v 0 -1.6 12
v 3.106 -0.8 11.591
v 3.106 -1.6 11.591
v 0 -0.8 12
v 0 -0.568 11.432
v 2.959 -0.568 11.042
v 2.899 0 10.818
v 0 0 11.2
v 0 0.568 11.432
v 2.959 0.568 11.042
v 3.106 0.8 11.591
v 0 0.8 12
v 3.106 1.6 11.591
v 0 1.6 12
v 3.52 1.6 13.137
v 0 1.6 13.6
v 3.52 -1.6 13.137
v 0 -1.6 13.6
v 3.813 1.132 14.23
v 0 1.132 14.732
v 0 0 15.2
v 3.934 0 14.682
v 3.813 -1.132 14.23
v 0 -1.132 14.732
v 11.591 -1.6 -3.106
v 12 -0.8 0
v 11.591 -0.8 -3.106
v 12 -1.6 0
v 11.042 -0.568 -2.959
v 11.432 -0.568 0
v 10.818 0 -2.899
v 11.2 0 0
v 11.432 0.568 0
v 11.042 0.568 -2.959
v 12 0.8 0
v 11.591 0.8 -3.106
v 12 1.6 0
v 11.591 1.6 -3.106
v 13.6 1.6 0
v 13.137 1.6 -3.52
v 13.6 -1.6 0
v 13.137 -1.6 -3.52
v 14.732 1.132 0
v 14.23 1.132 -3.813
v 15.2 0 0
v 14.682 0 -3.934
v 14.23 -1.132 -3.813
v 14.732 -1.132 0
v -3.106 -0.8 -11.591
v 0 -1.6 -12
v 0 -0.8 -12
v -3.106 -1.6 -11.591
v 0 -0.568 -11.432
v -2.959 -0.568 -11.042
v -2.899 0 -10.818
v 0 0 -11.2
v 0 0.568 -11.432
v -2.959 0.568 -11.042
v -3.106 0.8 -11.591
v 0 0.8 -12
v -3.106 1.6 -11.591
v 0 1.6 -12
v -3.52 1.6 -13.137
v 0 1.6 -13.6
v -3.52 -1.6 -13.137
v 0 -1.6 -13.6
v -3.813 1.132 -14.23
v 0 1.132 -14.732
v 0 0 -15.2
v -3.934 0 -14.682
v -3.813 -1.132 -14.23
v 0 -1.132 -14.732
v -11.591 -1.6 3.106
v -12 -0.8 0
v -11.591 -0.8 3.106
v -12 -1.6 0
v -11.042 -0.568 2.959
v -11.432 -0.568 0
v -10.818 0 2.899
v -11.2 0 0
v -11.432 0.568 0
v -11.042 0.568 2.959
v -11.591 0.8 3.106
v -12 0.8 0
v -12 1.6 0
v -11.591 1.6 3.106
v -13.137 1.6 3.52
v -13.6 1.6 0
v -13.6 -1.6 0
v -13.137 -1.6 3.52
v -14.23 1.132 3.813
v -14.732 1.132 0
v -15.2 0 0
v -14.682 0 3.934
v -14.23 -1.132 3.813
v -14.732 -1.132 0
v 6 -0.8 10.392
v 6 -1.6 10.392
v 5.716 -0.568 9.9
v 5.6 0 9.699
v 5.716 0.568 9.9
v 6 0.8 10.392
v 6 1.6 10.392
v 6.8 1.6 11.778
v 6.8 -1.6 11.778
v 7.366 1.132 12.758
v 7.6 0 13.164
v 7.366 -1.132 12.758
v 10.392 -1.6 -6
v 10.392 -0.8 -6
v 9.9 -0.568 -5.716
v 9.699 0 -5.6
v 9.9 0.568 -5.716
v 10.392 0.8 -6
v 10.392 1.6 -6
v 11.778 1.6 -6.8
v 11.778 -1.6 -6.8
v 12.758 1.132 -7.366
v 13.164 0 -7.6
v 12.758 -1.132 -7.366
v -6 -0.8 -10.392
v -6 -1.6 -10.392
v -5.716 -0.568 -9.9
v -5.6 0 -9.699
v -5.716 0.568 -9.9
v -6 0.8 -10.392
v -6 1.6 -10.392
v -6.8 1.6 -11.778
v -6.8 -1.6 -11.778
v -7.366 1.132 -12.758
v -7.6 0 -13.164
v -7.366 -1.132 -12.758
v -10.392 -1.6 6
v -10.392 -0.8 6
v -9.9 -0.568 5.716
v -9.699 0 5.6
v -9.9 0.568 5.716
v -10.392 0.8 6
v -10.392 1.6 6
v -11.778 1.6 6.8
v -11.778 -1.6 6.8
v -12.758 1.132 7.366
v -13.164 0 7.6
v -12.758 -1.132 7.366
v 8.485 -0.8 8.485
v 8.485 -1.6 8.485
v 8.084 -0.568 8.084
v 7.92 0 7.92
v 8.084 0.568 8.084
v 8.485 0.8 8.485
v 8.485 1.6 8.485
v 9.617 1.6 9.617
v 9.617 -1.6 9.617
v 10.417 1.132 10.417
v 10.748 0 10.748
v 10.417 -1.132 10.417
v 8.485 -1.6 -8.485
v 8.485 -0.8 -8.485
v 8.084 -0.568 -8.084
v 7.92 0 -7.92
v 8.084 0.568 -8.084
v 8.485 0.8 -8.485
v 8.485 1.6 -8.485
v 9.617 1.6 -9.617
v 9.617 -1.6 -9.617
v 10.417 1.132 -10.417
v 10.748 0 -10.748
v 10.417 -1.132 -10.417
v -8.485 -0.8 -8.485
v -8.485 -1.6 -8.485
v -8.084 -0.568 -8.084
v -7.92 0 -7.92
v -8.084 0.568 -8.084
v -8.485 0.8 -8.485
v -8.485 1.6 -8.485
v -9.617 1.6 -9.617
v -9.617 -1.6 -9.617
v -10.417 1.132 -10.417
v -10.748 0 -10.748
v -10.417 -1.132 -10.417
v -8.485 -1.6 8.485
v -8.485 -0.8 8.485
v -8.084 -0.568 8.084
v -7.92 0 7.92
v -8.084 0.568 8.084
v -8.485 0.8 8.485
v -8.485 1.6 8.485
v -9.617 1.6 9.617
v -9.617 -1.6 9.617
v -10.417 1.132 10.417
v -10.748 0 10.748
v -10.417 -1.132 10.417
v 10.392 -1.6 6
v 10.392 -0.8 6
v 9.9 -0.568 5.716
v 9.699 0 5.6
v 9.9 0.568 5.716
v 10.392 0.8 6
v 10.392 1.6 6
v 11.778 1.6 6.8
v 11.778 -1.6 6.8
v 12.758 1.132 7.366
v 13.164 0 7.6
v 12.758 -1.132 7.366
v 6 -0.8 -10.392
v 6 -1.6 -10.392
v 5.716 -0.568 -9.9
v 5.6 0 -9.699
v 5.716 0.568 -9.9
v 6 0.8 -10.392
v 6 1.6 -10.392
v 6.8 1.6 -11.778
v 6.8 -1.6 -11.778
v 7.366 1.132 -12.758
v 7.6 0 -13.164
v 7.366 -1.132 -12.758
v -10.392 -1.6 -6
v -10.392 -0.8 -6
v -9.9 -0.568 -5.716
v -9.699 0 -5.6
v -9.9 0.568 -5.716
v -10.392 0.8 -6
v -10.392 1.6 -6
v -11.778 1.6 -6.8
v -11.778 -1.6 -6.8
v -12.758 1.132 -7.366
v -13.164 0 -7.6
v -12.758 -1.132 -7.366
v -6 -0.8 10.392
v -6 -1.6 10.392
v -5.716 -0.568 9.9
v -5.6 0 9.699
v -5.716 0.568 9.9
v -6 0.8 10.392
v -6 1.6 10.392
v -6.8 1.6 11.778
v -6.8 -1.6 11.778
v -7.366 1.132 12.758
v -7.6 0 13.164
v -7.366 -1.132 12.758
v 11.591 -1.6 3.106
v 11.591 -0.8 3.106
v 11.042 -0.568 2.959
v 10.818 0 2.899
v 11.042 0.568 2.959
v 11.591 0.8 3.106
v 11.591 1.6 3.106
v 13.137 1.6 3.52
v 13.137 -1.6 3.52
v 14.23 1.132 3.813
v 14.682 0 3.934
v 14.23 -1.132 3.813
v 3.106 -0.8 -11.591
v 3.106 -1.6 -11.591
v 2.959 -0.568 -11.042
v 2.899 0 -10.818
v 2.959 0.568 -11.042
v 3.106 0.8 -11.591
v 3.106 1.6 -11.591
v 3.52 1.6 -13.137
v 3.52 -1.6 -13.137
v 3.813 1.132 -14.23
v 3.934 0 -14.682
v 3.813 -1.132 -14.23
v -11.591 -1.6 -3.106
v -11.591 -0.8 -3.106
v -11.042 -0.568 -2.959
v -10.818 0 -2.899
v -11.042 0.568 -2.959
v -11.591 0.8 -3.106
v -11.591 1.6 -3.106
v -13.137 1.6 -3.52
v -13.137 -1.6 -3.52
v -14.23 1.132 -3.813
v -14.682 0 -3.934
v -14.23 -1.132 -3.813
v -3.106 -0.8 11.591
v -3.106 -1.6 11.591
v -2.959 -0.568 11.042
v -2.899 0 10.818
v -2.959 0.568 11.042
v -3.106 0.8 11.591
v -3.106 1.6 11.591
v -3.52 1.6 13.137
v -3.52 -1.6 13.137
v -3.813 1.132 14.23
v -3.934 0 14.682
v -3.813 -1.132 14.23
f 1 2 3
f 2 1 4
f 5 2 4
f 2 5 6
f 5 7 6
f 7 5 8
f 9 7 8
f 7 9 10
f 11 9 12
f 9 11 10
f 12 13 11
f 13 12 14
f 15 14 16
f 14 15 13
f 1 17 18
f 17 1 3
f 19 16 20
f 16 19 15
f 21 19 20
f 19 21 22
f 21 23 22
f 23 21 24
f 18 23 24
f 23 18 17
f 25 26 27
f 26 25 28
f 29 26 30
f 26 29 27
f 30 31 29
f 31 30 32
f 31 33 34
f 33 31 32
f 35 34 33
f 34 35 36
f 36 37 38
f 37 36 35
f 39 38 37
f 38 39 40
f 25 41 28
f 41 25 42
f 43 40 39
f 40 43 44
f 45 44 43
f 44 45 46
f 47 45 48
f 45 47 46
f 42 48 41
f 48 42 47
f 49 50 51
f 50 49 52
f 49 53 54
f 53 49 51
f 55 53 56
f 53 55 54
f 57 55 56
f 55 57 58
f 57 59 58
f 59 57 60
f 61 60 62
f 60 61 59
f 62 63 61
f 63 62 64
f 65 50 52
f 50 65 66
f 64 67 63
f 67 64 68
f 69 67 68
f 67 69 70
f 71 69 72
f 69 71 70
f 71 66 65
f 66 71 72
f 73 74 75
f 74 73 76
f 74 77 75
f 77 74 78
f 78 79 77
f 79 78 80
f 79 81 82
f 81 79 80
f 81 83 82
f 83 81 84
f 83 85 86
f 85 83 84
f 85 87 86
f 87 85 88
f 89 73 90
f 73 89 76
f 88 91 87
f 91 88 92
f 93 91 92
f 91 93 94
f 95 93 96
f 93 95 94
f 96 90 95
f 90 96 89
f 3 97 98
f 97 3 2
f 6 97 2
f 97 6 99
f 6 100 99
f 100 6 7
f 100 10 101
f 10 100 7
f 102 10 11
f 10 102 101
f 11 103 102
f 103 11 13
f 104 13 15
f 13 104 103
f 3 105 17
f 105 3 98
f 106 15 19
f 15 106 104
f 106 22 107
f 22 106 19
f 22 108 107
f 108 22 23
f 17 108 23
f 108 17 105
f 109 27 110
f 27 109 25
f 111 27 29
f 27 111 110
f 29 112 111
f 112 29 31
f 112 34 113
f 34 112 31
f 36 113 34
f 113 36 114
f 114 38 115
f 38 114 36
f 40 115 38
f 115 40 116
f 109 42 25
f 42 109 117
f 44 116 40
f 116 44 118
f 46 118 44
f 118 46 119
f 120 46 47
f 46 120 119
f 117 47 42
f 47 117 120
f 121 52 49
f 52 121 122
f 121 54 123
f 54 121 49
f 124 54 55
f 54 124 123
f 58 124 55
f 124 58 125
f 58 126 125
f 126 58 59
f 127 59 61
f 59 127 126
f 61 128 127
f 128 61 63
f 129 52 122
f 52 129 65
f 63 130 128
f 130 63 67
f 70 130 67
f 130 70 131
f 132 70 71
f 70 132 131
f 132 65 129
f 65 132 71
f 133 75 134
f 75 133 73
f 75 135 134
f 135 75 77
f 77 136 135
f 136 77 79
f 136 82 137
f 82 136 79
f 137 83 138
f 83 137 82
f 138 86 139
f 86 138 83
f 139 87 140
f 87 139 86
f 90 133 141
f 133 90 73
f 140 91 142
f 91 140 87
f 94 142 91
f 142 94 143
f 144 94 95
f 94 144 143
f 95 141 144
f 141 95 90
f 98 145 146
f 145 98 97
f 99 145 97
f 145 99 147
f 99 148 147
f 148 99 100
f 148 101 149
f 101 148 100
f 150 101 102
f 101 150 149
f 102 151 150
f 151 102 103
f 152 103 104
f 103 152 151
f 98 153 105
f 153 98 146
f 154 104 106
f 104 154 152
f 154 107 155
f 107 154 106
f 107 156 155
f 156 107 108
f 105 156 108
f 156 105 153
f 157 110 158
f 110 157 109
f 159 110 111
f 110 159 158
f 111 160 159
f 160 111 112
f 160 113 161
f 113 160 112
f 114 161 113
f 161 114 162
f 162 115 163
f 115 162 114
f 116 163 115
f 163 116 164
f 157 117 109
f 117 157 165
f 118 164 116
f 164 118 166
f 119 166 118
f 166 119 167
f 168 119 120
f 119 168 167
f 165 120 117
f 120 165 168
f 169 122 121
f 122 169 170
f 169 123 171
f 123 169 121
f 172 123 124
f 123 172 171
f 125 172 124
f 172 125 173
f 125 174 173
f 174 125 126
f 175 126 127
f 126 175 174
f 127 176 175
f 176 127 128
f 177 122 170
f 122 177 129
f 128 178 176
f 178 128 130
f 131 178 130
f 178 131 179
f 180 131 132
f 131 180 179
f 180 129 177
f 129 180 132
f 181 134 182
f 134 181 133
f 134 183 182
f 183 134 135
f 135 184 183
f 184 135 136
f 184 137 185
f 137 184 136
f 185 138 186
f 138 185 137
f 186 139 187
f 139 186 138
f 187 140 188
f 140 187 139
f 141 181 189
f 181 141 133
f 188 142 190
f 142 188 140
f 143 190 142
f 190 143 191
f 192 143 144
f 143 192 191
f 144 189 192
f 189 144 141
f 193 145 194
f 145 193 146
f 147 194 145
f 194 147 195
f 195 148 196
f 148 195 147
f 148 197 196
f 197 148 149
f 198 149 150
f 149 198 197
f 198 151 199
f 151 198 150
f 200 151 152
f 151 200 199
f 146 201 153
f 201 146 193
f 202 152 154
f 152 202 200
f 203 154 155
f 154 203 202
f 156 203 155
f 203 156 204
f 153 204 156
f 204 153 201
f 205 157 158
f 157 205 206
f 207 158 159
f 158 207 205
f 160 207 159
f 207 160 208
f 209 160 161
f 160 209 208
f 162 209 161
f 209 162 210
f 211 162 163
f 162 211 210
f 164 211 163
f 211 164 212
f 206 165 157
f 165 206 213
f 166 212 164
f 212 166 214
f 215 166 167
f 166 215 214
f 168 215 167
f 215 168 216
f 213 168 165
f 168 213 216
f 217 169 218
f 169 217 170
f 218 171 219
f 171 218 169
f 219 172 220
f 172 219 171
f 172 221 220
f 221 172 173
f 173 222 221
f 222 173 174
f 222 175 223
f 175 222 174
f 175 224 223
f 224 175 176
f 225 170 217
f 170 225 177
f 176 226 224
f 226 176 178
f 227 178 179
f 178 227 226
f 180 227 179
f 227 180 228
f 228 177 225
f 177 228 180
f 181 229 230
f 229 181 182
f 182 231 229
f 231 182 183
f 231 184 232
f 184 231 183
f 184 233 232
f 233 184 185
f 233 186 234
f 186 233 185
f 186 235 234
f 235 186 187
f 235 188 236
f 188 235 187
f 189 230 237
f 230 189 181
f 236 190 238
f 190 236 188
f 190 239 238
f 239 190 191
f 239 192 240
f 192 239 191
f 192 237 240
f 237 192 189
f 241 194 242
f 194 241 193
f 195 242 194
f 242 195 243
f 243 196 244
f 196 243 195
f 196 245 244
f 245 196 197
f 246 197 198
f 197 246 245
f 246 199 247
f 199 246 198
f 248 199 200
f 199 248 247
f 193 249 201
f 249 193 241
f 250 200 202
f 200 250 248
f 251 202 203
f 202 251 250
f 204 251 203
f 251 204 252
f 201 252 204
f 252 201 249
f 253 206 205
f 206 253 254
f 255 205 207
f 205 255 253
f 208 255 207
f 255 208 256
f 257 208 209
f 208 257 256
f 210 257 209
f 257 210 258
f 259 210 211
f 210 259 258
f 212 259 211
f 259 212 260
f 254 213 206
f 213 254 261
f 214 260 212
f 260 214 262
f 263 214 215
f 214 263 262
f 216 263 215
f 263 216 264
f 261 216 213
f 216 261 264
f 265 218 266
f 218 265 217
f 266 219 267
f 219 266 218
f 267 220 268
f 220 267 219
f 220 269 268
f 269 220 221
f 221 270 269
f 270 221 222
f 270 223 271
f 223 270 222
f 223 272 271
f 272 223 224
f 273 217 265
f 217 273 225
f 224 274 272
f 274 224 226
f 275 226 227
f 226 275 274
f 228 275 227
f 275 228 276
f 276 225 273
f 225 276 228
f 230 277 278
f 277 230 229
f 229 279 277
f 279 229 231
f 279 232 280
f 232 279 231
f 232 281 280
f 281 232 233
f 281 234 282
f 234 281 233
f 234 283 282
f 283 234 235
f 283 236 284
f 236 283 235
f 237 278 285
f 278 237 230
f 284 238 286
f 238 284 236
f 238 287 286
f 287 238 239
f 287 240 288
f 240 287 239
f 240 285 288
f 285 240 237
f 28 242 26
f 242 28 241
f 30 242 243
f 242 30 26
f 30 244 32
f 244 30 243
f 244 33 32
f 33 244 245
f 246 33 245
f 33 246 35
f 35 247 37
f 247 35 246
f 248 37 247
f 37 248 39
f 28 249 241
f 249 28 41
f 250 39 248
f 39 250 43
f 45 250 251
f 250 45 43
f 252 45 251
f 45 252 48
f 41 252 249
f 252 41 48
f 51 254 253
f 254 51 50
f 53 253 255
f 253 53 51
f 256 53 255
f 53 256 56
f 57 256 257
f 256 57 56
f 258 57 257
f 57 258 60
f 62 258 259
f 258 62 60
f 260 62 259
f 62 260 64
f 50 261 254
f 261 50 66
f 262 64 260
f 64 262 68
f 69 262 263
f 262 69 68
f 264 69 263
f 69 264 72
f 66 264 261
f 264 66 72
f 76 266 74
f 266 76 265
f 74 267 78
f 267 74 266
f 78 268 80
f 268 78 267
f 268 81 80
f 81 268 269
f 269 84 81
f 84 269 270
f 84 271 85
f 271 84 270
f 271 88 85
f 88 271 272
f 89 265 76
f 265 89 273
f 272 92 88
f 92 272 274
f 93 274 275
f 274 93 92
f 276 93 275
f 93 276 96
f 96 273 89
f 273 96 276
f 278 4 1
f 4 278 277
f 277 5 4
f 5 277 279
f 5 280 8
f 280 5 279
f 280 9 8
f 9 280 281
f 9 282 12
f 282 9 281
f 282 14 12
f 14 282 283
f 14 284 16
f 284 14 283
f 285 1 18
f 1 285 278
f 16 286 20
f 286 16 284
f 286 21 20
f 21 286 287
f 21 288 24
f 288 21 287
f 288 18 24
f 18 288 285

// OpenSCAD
// file: ../p/4-4edge.scad
use <../lib.scad>
$fa=1; $fs=0.2;
function ldraw_lib__4_4edge(realsolid=false) = [
// 0 Circle 1.0
// 0 Name: 4-4edge.dat
// 0 Author: James Jessiman
// 0 !LDRAW_ORG Primitive UPDATE 2017-01
// 0 !LICENSE Licensed under CC BY 2.0 and CC BY 4.0 : see CAreadme.txt
// 
// 0 BFC CERTIFY CCW
  [0,"BFC","CERTIFY"],
  [0,"BFC","CCW"],
// 
// 0 !HISTORY 1998-12-15 [PTadmin] Official Update 1998-10
// 0 !HISTORY 2005-12-28 [PTadmin] Official Update 2005-01
// 0 !HISTORY 2007-06-24 [PTadmin] Header formatted for Contributor Agreement
// 0 !HISTORY 2008-07-01 [PTadmin] Official Update 2008-01
// 0 !HISTORY 2017-01-15 [Steffen] BFCed
// 0 !HISTORY 2017-12-30 [PTadmin] Official Update 2017-01
// 
// 
// 2 24 1 0 0 0.9239 0 0.3827
  [2,24,1,0,0,0.9239,0,0.3827],
// 2 24 0.9239 0 0.3827 0.7071 0 0.7071
  [2,24,0.9239,0,0.3827,0.7071,0,0.7071],
// 2 24 0.7071 0 0.7071 0.3827 0 0.9239
  [2,24,0.7071,0,0.7071,0.3827,0,0.9239],
// 2 24 0.3827 0 0.9239 0 0 1
  [2,24,0.3827,0,0.9239,0,0,1],
// 2 24 0 0 1 -0.3827 0 0.9239
  [2,24,0,0,1,-0.3827,0,0.9239],
// 2 24 -0.3827 0 0.9239 -0.7071 0 0.7071
  [2,24,-0.3827,0,0.9239,-0.7071,0,0.7071],
// 2 24 -0.7071 0 0.7071 -0.9239 0 0.3827
  [2,24,-0.7071,0,0.7071,-0.9239,0,0.3827],
// 2 24 -0.9239 0 0.3827 -1 0 -0
  [2,24,-0.9239,0,0.3827,-1,0,-0],
// 2 24 -1 0 -0 -0.9239 0 -0.3827
  [2,24,-1,0,-0,-0.9239,0,-0.3827],
// 2 24 -0.9239 0 -0.3827 -0.7071 0 -0.7071
  [2,24,-0.9239,0,-0.3827,-0.7071,0,-0.7071],
// 2 24 -0.7071 0 -0.7071 -0.3827 0 -0.9239
  [2,24,-0.7071,0,-0.7071,-0.3827,0,-0.9239],
// 2 24 -0.3827 0 -0.9239 0 0 -1
  [2,24,-0.3827,0,-0.9239,0,0,-1],
// 2 24 0 0 -1 0.3827 0 -0.9239
  [2,24,0,0,-1,0.3827,0,-0.9239],
// 2 24 0.3827 0 -0.9239 0.7071 0 -0.7071
  [2,24,0.3827,0,-0.9239,0.7071,0,-0.7071],
// 2 24 0.7071 0 -0.7071 0.9239 0 -0.3827
  [2,24,0.7071,0,-0.7071,0.9239,0,-0.3827],
// 2 24 0.9239 0 -0.3827 1 0 0
  [2,24,0.9239,0,-0.3827,1,0,0],
];
module ldraw_lib__4_4edge(step=0, col=false, unit=2/5, alt=false, line=0.2, solid=!$preview)
    makepoly(ldraw_lib__4_4edge(solid), step=step, col=col, unit=unit, alt=alt, line=line, solid=solid);
ldraw_lib__4_4edge(line=0.2);
// file: ../p/4-4disc.scad
use <../lib.scad>
$fa=1; $fs=0.2;
function ldraw_lib__4_4disc(realsolid=false) = [
// 0 Disc 1.0
// 0 Name: 4-4disc.dat
// 0 Author: James Jessiman
// 0 !LDRAW_ORG Primitive UPDATE 2002-02
// 0 !LICENSE Licensed under CC BY 2.0 and CC BY 4.0 : see CAreadme.txt
// 
// 0 BFC CERTIFY CCW
  [0,"BFC","CERTIFY"],
  [0,"BFC","CCW"],
// 
// 0 !HISTORY 1998-12-15 [PTadmin] Official Update 1998-10
// 0 !HISTORY 2002-03-23 [sbliss] Added BFC statement
// 0 !HISTORY 2002-04-25 [PTadmin] Official Update 2002-02
// 0 !HISTORY 2007-06-24 [PTadmin] Header formatted for Contributor Agreement
// 0 !HISTORY 2008-07-01 [PTadmin] Official Update 2008-01
// 
// 
// 3 16 0 0 0 1 0 0 0.9239 0 0.3827
  [3,16,0,0,0,1,0,0,0.9239,0,0.3827],
// 3 16 0 0 0 0.9239 0 0.3827 0.7071 0 0.7071
  [3,16,0,0,0,0.9239,0,0.3827,0.7071,0,0.7071],
// 3 16 0 0 0 0.7071 0 0.7071 0.3827 0 0.9239
  [3,16,0,0,0,0.7071,0,0.7071,0.3827,0,0.9239],
// 3 16 0 0 0 0.3827 0 0.9239 0 0 1
  [3,16,0,0,0,0.3827,0,0.9239,0,0,1],
// 3 16 0 0 0 0 0 1 -0.3827 0 0.9239
  [3,16,0,0,0,0,0,1,-0.3827,0,0.9239],
// 3 16 0 0 0 -0.3827 0 0.9239 -0.7071 0 0.7071
  [3,16,0,0,0,-0.3827,0,0.9239,-0.7071,0,0.7071],
// 3 16 0 0 0 -0.7071 0 0.7071 -0.9239 0 0.3827
  [3,16,0,0,0,-0.7071,0,0.7071,-0.9239,0,0.3827],
// 3 16 0 0 0 -0.9239 0 0.3827 -1 0 -0
  [3,16,0,0,0,-0.9239,0,0.3827,-1,0,-0],
// 3 16 0 0 0 -1 0 -0 -0.9239 0 -0.3827
  [3,16,0,0,0,-1,0,-0,-0.9239,0,-0.3827],
// 3 16 0 0 0 -0.9239 0 -0.3827 -0.7071 0 -0.7071
  [3,16,0,0,0,-0.9239,0,-0.3827,-0.7071,0,-0.7071],
// 3 16 0 0 0 -0.7071 0 -0.7071 -0.3827 0 -0.9239
  [3,16,0,0,0,-0.7071,0,-0.7071,-0.3827,0,-0.9239],
// 3 16 0 0 0 -0.3827 0 -0.9239 0 0 -1
  [3,16,0,0,0,-0.3827,0,-0.9239,0,0,-1],
// 3 16 0 0 0 0 0 -1 0.3827 0 -0.9239
  [3,16,0,0,0,0,0,-1,0.3827,0,-0.9239],
// 3 16 0 0 0 0.3827 0 -0.9239 0.7071 0 -0.7071
  [3,16,0,0,0,0.3827,0,-0.9239,0.7071,0,-0.7071],
// 3 16 0 0 0 0.7071 0 -0.7071 0.9239 0 -0.3827
  [3,16,0,0,0,0.7071,0,-0.7071,0.9239,0,-0.3827],
// 3 16 0 0 0 0.9239 0 -0.3827 1 0 0
  [3,16,0,0,0,0.9239,0,-0.3827,1,0,0],
// 0
];
module ldraw_lib__4_4disc(step=0, col=false, unit=2/5, alt=false, line=0.2, solid=!$preview)
    makepoly(ldraw_lib__4_4disc(solid), step=step, col=col, unit=unit, alt=alt, line=line, solid=solid);
ldraw_lib__4_4disc(line=0.2);
// file: ../p/4-4cyli.scad
use <../lib.scad>
$fa=1; $fs=0.2;
function ldraw_lib__4_4cyli(realsolid=false) = [
// 0 Cylinder 1.0
// 0 Name: 4-4cyli.dat
// 0 Author: James Jessiman
// 0 !LDRAW_ORG Primitive UPDATE 2005-01
// 0 !LICENSE Licensed under CC BY 2.0 and CC BY 4.0 : see CAreadme.txt
// 
// 0 BFC CERTIFY CCW
  [0,"BFC","CERTIFY"],
  [0,"BFC","CCW"],
// 
// 0 !HISTORY 1998-12-15 [PTadmin] Official Update 1998-10
// 0 !HISTORY 2002-03-23 [sbliss] Added BFC statement; merged headers from files in distributions LDraw 0.27 and Complete.
// 0 !HISTORY 2002-04-25 [PTadmin] Official Update 2002-02
// 0 !HISTORY 2004-12-14 [guyvivan] BFC CCW
// 0 !HISTORY 2005-12-28 [PTadmin] Official Update 2005-01
// 0 !HISTORY 2007-06-24 [PTadmin] Header formatted for Contributor Agreement
// 0 !HISTORY 2008-07-01 [PTadmin] Official Update 2008-01
// 
// 
// 4 16 1 1 0 0.9239 1 0.3827 0.9239 0 0.3827 1 0 0
  [4,16,1,1,0,0.9239,1,0.3827,0.9239,0,0.3827,1,0,0],
// 5 24 1 0 0 1 1 0 0.9239 0 0.3827 0.9239 0 -0.3827
  [5,24,1,0,0,1,1,0,0.9239,0,0.3827,0.9239,0,-0.3827],
// 4 16 0.9239 1 0.3827 0.7071 1 0.7071 0.7071 0 0.7071 0.9239 0 0.3827
  [4,16,0.9239,1,0.3827,0.7071,1,0.7071,0.7071,0,0.7071,0.9239,0,0.3827],
// 5 24 0.9239 0 0.3827 0.9239 1 0.3827 0.7071 0 0.7071 1 0 0
  [5,24,0.9239,0,0.3827,0.9239,1,0.3827,0.7071,0,0.7071,1,0,0],
// 4 16 0.7071 1 0.7071 0.3827 1 0.9239 0.3827 0 0.9239 0.7071 0 0.7071
  [4,16,0.7071,1,0.7071,0.3827,1,0.9239,0.3827,0,0.9239,0.7071,0,0.7071],
// 5 24 0.7071 0 0.7071 0.7071 1 0.7071 0.3827 0 0.9239 0.9239 0 0.3827
  [5,24,0.7071,0,0.7071,0.7071,1,0.7071,0.3827,0,0.9239,0.9239,0,0.3827],
// 4 16 0.3827 1 0.9239 0 1 1 0 0 1 0.3827 0 0.9239
  [4,16,0.3827,1,0.9239,0,1,1,0,0,1,0.3827,0,0.9239],
// 5 24 0.3827 0 0.9239 0.3827 1 0.9239 0 0 1 0.7071 0 0.7071
  [5,24,0.3827,0,0.9239,0.3827,1,0.9239,0,0,1,0.7071,0,0.7071],
// 4 16 0 1 1 -0.3827 1 0.9239 -0.3827 0 0.9239 0 0 1
  [4,16,0,1,1,-0.3827,1,0.9239,-0.3827,0,0.9239,0,0,1],
// 5 24 0 0 1 0 1 1 -0.3827 0 0.9239 0.3827 0 0.9239
  [5,24,0,0,1,0,1,1,-0.3827,0,0.9239,0.3827,0,0.9239],
// 4 16 -0.3827 1 0.9239 -0.7071 1 0.7071 -0.7071 0 0.7071 -0.3827 0 0.9239
  [4,16,-0.3827,1,0.9239,-0.7071,1,0.7071,-0.7071,0,0.7071,-0.3827,0,0.9239],
// 5 24 -0.3827 0 0.9239 -0.3827 1 0.9239 -0.7071 0 0.7071 0 0 1
  [5,24,-0.3827,0,0.9239,-0.3827,1,0.9239,-0.7071,0,0.7071,0,0,1],
// 4 16 -0.7071 1 0.7071 -0.9239 1 0.3827 -0.9239 0 0.3827 -0.7071 0 0.7071
  [4,16,-0.7071,1,0.7071,-0.9239,1,0.3827,-0.9239,0,0.3827,-0.7071,0,0.7071],
// 5 24 -0.7071 0 0.7071 -0.7071 1 0.7071 -0.9239 0 0.3827 -0.3827 0 0.9239
  [5,24,-0.7071,0,0.7071,-0.7071,1,0.7071,-0.9239,0,0.3827,-0.3827,0,0.9239],
// 4 16 -0.9239 1 0.3827 -1 1 0 -1 0 0 -0.9239 0 0.3827
  [4,16,-0.9239,1,0.3827,-1,1,0,-1,0,0,-0.9239,0,0.3827],
// 5 24 -0.9239 0 0.3827 -0.9239 1 0.3827 -1 0 0 -0.7071 0 0.7071
  [5,24,-0.9239,0,0.3827,-0.9239,1,0.3827,-1,0,0,-0.7071,0,0.7071],
// 4 16 -1 1 0 -0.9239 1 -0.3827 -0.9239 0 -0.3827 -1 0 0
  [4,16,-1,1,0,-0.9239,1,-0.3827,-0.9239,0,-0.3827,-1,0,0],
// 5 24 -1 0 0 -1 1 0 -0.9239 0 -0.3827 -0.9239 0 0.3827
  [5,24,-1,0,0,-1,1,0,-0.9239,0,-0.3827,-0.9239,0,0.3827],
// 4 16 -0.9239 1 -0.3827 -0.7071 1 -0.7071 -0.7071 0 -0.7071 -0.9239 0 -0.3827
  [4,16,-0.9239,1,-0.3827,-0.7071,1,-0.7071,-0.7071,0,-0.7071,-0.9239,0,-0.3827],
// 5 24 -0.9239 0 -0.3827 -0.9239 1 -0.3827 -0.7071 0 -0.7071 -1 0 0
  [5,24,-0.9239,0,-0.3827,-0.9239,1,-0.3827,-0.7071,0,-0.7071,-1,0,0],
// 4 16 -0.7071 1 -0.7071 -0.3827 1 -0.9239 -0.3827 0 -0.9239 -0.7071 0 -0.7071
  [4,16,-0.7071,1,-0.7071,-0.3827,1,-0.9239,-0.3827,0,-0.9239,-0.7071,0,-0.7071],
// 5 24 -0.7071 0 -0.7071 -0.7071 1 -0.7071 -0.3827 0 -0.9239 -0.9239 0 -0.3827
  [5,24,-0.7071,0,-0.7071,-0.7071,1,-0.7071,-0.3827,0,-0.9239,-0.9239,0,-0.3827],
// 4 16 -0.3827 1 -0.9239 0 1 -1 0 0 -1 -0.3827 0 -0.9239
  [4,16,-0.3827,1,-0.9239,0,1,-1,0,0,-1,-0.3827,0,-0.9239],
// 5 24 -0.3827 0 -0.9239 -0.3827 1 -0.9239 0 0 -1 -0.7071 0 -0.7071
  [5,24,-0.3827,0,-0.9239,-0.3827,1,-0.9239,0,0,-1,-0.7071,0,-0.7071],
// 4 16 0 1 -1 0.3827 1 -0.9239 0.3827 0 -0.9239 0 0 -1
  [4,16,0,1,-1,0.3827,1,-0.9239,0.3827,0,-0.9239,0,0,-1],
// 5 24 0 0 -1 0 1 -1 0.3827 0 -0.9239 -0.3827 0 -0.9239
  [5,24,0,0,-1,0,1,-1,0.3827,0,-0.9239,-0.3827,0,-0.9239],
// 4 16 0.3827 1 -0.9239 0.7071 1 -0.7071 0.7071 0 -0.7071 0.3827 0 -0.9239
  [4,16,0.3827,1,-0.9239,0.7071,1,-0.7071,0.7071,0,-0.7071,0.3827,0,-0.9239],
// 5 24 0.3827 0 -0.9239 0.3827 1 -0.9239 0.7071 0 -0.7071 0 0 -1
  [5,24,0.3827,0,-0.9239,0.3827,1,-0.9239,0.7071,0,-0.7071,0,0,-1],
// 4 16 0.7071 1 -0.7071 0.9239 1 -0.3827 0.9239 0 -0.3827 0.7071 0 -0.7071
  [4,16,0.7071,1,-0.7071,0.9239,1,-0.3827,0.9239,0,-0.3827,0.7071,0,-0.7071],
// 5 24 0.7071 0 -0.7071 0.7071 1 -0.7071 0.9239 0 -0.3827 0.3827 0 -0.9239
  [5,24,0.7071,0,-0.7071,0.7071,1,-0.7071,0.9239,0,-0.3827,0.3827,0,-0.9239],
// 4 16 0.9239 1 -0.3827 1 1 0 1 0 0 0.9239 0 -0.3827
  [4,16,0.9239,1,-0.3827,1,1,0,1,0,0,0.9239,0,-0.3827],
// 5 24 0.9239 0 -0.3827 0.9239 1 -0.3827 1 0 0 0.7071 0 -0.7071
  [5,24,0.9239,0,-0.3827,0.9239,1,-0.3827,1,0,0,0.7071,0,-0.7071],
// 0
];
module ldraw_lib__4_4cyli(step=0, col=false, unit=2/5, alt=false, line=0.2, solid=!$preview)
    makepoly(ldraw_lib__4_4cyli(solid), step=step, col=col, unit=unit, alt=alt, line=line, solid=solid);
ldraw_lib__4_4cyli(line=0.2);
// file: ../p/stud3.scad
use <../lib.scad>
use <4-4cyli.scad>
use <4-4disc.scad>
use <4-4edge.scad>
$fa=1; $fs=0.2;
function ldraw_lib__stud3(realsolid=false) = realsolid ? 
    [openscad(translate([0,0,-eps()], o=cylinder(4+eps(), r=4)),2)] : [
// 0 Stud Tube Solid
// 0 Name: stud3.dat
// 0 Author: James Jessiman
// 0 !LDRAW_ORG Primitive UPDATE 2012-01
// 0 !LICENSE Licensed under CC BY 2.0 and CC BY 4.0 : see CAreadme.txt
// 
// 0 BFC CERTIFY CCW
  [0,"BFC","CERTIFY"],
  [0,"BFC","CCW"],
// 
// 0 !HISTORY 2002-04-04 [sbliss] Modified for BFC compliance
// 0 !HISTORY 2002-04-25 [PTadmin] Official Update 2002-02
// 0 !HISTORY 2007-06-24 [PTadmin] Header formatted for Contributor Agreement
// 0 !HISTORY 2008-07-01 [PTadmin] Official Update 2008-01
// 0 !HISTORY 2012-02-16 [Philo] Changed to CCW
// 0 !HISTORY 2012-03-30 [PTadmin] Official Update 2012-01
// 
// 
// 1 16 0 -4 0 4 0 0 0 1 0 0 0 4 4-4edge.dat
  [1,16,0,-4,0,4,0,0,0,1,0,0,0,4, ldraw_lib__4_4edge(realsolid)],
// 1 16 0 0 0 4 0 0 0 1 0 0 0 4 4-4edge.dat
  [1,16,0,0,0,4,0,0,0,1,0,0,0,4, ldraw_lib__4_4edge(realsolid)],
// 1 16 0 -4 0 4 0 0 0 1 0 0 0 4 4-4disc.dat
  [1,16,0,-4,0,4,0,0,0,1,0,0,0,4, ldraw_lib__4_4disc(realsolid)],
// 1 16 0 -4 0 4 0 0 0 4 0 0 0 4 4-4cyli.dat
  [1,16,0,-4,0,4,0,0,0,4,0,0,0,4, ldraw_lib__4_4cyli(realsolid)],
];
module ldraw_lib__stud3(step=0, col=false, unit=2/5, alt=false, line=0.2, solid=!$preview)
    makepoly(ldraw_lib__stud3(solid), step=step, col=col, unit=unit, alt=alt, line=line, solid=solid);
ldraw_lib__stud3(line=0.2);
// file: ../p/stud.scad
use <../lib.scad>
use <4-4cyli.scad>
use <4-4disc.scad>
use <4-4edge.scad>
$fa=1; $fs=0.2;
function ldraw_lib__stud(realsolid=false) = realsolid ? 
    [openscad(translate([0,0,-eps()], o=cylinder(4+eps(), r=6)),2)] : [
// 0 Stud
// 0 Name: stud.dat
// 0 Author: James Jessiman
// 0 !LDRAW_ORG Primitive UPDATE 2012-01
// 0 !LICENSE Licensed under CC BY 2.0 and CC BY 4.0 : see CAreadme.txt
// 
// 0 BFC CERTIFY CCW
  [0,"BFC","CERTIFY"],
  [0,"BFC","CCW"],
// 
// 0 !HISTORY 2002-04-04 [sbliss] Modified for BFC compliance
// 0 !HISTORY 2002-04-25 [PTadmin] Official Update 2002-02
// 0 !HISTORY 2007-06-24 [PTadmin] Header formatted for Contributor Agreement
// 0 !HISTORY 2008-07-01 [PTadmin] Official Update 2008-01
// 0 !HISTORY 2012-02-16 [Philo] Changed to CCW
// 0 !HISTORY 2012-03-30 [PTadmin] Official Update 2012-01
// 
// 
// 1 16 0 0 0 6 0 0 0 1 0 0 0 6 4-4edge.dat
  [1,16,0,0,0,6,0,0,0,1,0,0,0,6, ldraw_lib__4_4edge(realsolid)],
// 1 16 0 -4 0 6 0 0 0 1 0 0 0 6 4-4edge.dat
  [1,16,0,-4,0,6,0,0,0,1,0,0,0,6, ldraw_lib__4_4edge(realsolid)],
// 1 16 0 0 0 6 0 0 0 -4 0 0 0 6 4-4cyli.dat
  [1,16,0,0,0,6,0,0,0,-4,0,0,0,6, ldraw_lib__4_4cyli(realsolid)],
// 1 16 0 -4 0 6 0 0 0 1 0 0 0 6 4-4disc.dat
  [1,16,0,-4,0,6,0,0,0,1,0,0,0,6, ldraw_lib__4_4disc(realsolid)],
];
module ldraw_lib__stud(step=0, col=false, unit=2/5, alt=false, line=0.2, solid=!$preview)
    makepoly(ldraw_lib__stud(solid), step=step, col=col, unit=unit, alt=alt, line=line, solid=solid);
ldraw_lib__stud(line=0.2);
// file: ../p/box5.scad
use <../lib.scad>
$fa=1; $fs=0.2;
function ldraw_lib__box5(realsolid=false) = [
// 0 Box with 5 Faces and All Edges
// 0 Name: box5.dat
// 0 Author: James Jessiman
// 0 !LDRAW_ORG Primitive UPDATE 2012-01
// 0 !LICENSE Licensed under CC BY 2.0 and CC BY 4.0 : see CAreadme.txt
// 
// 0 BFC CERTIFY CCW
  [0,"BFC","CERTIFY"],
  [0,"BFC","CCW"],
// 
// 0 !HISTORY 2002-04-03 [sbliss] Modified for BFC compliance
// 0 !HISTORY 2002-04-25 [PTadmin] Official Update 2002-02
// 0 !HISTORY 2007-06-24 [PTadmin] Header formatted for Contributor Agreement
// 0 !HISTORY 2008-07-01 [PTadmin] Official Update 2008-01
// 0 !HISTORY 2012-02-16 [Philo] Changed to CCW
// 0 !HISTORY 2012-03-30 [PTadmin] Official Update 2012-01
// 
// 
// 2 24 1 1 1 -1 1 1
  [2,24,1,1,1,-1,1,1],
// 2 24 -1 1 1 -1 1 -1
  [2,24,-1,1,1,-1,1,-1],
// 2 24 -1 1 -1 1 1 -1
  [2,24,-1,1,-1,1,1,-1],
// 2 24 1 1 -1 1 1 1
  [2,24,1,1,-1,1,1,1],
// 2 24 1 0 1 -1 0 1
  [2,24,1,0,1,-1,0,1],
// 2 24 -1 0 1 -1 0 -1
  [2,24,-1,0,1,-1,0,-1],
// 2 24 -1 0 -1 1 0 -1
  [2,24,-1,0,-1,1,0,-1],
// 2 24 1 0 -1 1 0 1
  [2,24,1,0,-1,1,0,1],
// 2 24 1 0 1 1 1 1
  [2,24,1,0,1,1,1,1],
// 2 24 -1 0 1 -1 1 1
  [2,24,-1,0,1,-1,1,1],
// 2 24 1 0 -1 1 1 -1
  [2,24,1,0,-1,1,1,-1],
// 2 24 -1 0 -1 -1 1 -1
  [2,24,-1,0,-1,-1,1,-1],
// 4 16 -1 1 1 1 1 1 1 1 -1 -1 1 -1
  [4,16,-1,1,1,1,1,1,1,1,-1,-1,1,-1],
// 4 16 -1 1 1 -1 0 1 1 0 1 1 1 1
  [4,16,-1,1,1,-1,0,1,1,0,1,1,1,1],
// 4 16 -1 1 -1 -1 0 -1 -1 0 1 -1 1 1
  [4,16,-1,1,-1,-1,0,-1,-1,0,1,-1,1,1],
// 4 16 1 1 -1 1 0 -1 -1 0 -1 -1 1 -1
  [4,16,1,1,-1,1,0,-1,-1,0,-1,-1,1,-1],
// 4 16 1 1 1 1 0 1 1 0 -1 1 1 -1
  [4,16,1,1,1,1,0,1,1,0,-1,1,1,-1],
];
module ldraw_lib__box5(step=0, col=false, unit=2/5, alt=false, line=0.2, solid=!$preview)
    makepoly(ldraw_lib__box5(solid), step=step, col=col, unit=unit, alt=alt, line=line, solid=solid);
ldraw_lib__box5(line=0.2);
// file: ../p/box4t.scad
use <../lib.scad>
$fa=1; $fs=0.2;
function ldraw_lib__box4t(realsolid=false) = [
// 0 Box with 4 Adjacent Faces and All Edges
// 0 Name: box4t.dat
// 0 Author: Tore Eriksson [Tore_Eriksson]
// 0 !LDRAW_ORG Primitive UPDATE 2003-02
// 0 !LICENSE Licensed under CC BY 2.0 and CC BY 4.0 : see CAreadme.txt
// 
// 0 BFC CERTIFY CCW
  [0,"BFC","CERTIFY"],
  [0,"BFC","CCW"],
// 
// 0 !HISTORY 1997-09-29 [PTadmin] Official Update 1997-15
// 0 !HISTORY 2002-08-31 [izanette] Modified with WINDZ for BFC compliance
// 0 !HISTORY 2003-08-01 [PTadmin] Official Update 2003-02
// 0 !HISTORY 2007-06-24 [PTadmin] Header formatted for Contributor Agreement
// 0 !HISTORY 2008-07-01 [PTadmin] Official Update 2008-01
// 
// 
// 2 24 1 1 1 -1 1 1
  [2,24,1,1,1,-1,1,1],
// 2 24 -1 1 1 -1 1 -1
  [2,24,-1,1,1,-1,1,-1],
// 2 24 -1 1 -1 1 1 -1
  [2,24,-1,1,-1,1,1,-1],
// 2 24 1 1 -1 1 1 1
  [2,24,1,1,-1,1,1,1],
// 2 24 1 0 1 -1 0 1
  [2,24,1,0,1,-1,0,1],
// 2 24 -1 0 1 -1 0 -1
  [2,24,-1,0,1,-1,0,-1],
// 2 24 -1 0 -1 1 0 -1
  [2,24,-1,0,-1,1,0,-1],
// 2 24 1 0 -1 1 0 1
  [2,24,1,0,-1,1,0,1],
// 2 24 1 0 1 1 1 1
  [2,24,1,0,1,1,1,1],
// 2 24 -1 0 1 -1 1 1
  [2,24,-1,0,1,-1,1,1],
// 2 24 1 0 -1 1 1 -1
  [2,24,1,0,-1,1,1,-1],
// 2 24 -1 0 -1 -1 1 -1
  [2,24,-1,0,-1,-1,1,-1],
// 4 16 1 1 1 1 1 -1 -1 1 -1 -1 1 1
  [4,16,1,1,1,1,1,-1,-1,1,-1,-1,1,1],
// 4 16 1 1 1 -1 1 1 -1 0 1 1 0 1
  [4,16,1,1,1,-1,1,1,-1,0,1,1,0,1],
// 4 16 -1 1 1 -1 1 -1 -1 0 -1 -1 0 1
  [4,16,-1,1,1,-1,1,-1,-1,0,-1,-1,0,1],
// 0 4 16 -1 1 -1 -1 0 -1 1 0 -1 1 1 -1
// 4 16 1 1 -1 1 1 1 1 0 1 1 0 -1
  [4,16,1,1,-1,1,1,1,1,0,1,1,0,-1],
// 0
];
module ldraw_lib__box4t(step=0, col=false, unit=2/5, alt=false, line=0.2, solid=!$preview)
    makepoly(ldraw_lib__box4t(solid), step=step, col=col, unit=unit, alt=alt, line=line, solid=solid);
ldraw_lib__box4t(line=0.2);
// file: s/3004s01.scad
use <../../lib.scad>
use <../../p/box4t.scad>
use <../../p/box5.scad>
use <../../p/stud.scad>
use <../../p/stud3.scad>
$fa=1; $fs=0.2;
function ldraw_lib__s__3004s01(realsolid=false) = [
// 0 ~Brick  1 x  2 without Front Face
// 0 Name: s\3004s01.dat
// 0 Author: James Jessiman
// 0 !LDRAW_ORG Subpart UPDATE 2003-03
// 0 !LICENSE Licensed under CC BY 2.0 and CC BY 4.0 : see CAreadme.txt
// 
// 0 BFC CERTIFY CCW
  [0,"BFC","CERTIFY"],
  [0,"BFC","CCW"],
// 
// 0 !HISTORY 2003-09-07 [jriley] Subfiling, BFC
// 0 !HISTORY 2003-12-19 [PTadmin] Official Update 2003-03
// 0 !HISTORY 2007-08-29 [PTadmin] Header formatted for Contributor Agreement
// 0 !HISTORY 2008-07-01 [PTadmin] Official Update 2008-01
// 
// 
// 1 16 0 4 0 1 0 0 0 -5 0 0 0 1 stud3.dat
  [1,16,0,4,0,1,0,0,0,-5,0,0,0,1, ldraw_lib__stud3(realsolid)],
// 0 BFC INVERTNEXT
  [0,"BFC","INVERTNEXT"],
// 1 16 0 24 0 16 0 0 0 -20 0 0 0 6 box5.dat
  [1,16,0,24,0,16,0,0,0,-20,0,0,0,6, ldraw_lib__box5(realsolid)],
// 4 16 20 24 10 16 24 6 -16 24 6 -20 24 10
  [4,16,20,24,10,16,24,6,-16,24,6,-20,24,10],
// 4 16 -20 24 10 -16 24 6 -16 24 -6 -20 24 -10
  [4,16,-20,24,10,-16,24,6,-16,24,-6,-20,24,-10],
// 4 16 -20 24 -10 -16 24 -6 16 24 -6 20 24 -10
  [4,16,-20,24,-10,-16,24,-6,16,24,-6,20,24,-10],
// 4 16 20 24 -10 16 24 -6 16 24 6 20 24 10
  [4,16,20,24,-10,16,24,-6,16,24,6,20,24,10],
// 1 16 0 24 0 20 0 0 0 -24 0 0 0 10 box4t.dat
  [1,16,0,24,0,20,0,0,0,-24,0,0,0,10, ldraw_lib__box4t(realsolid)],
// 1 16 10 0 0 1 0 0 0 1 0 0 0 1 stud.dat
  [1,16,10,0,0,1,0,0,0,1,0,0,0,1, ldraw_lib__stud(realsolid)],
// 1 16 -10 0 0 1 0 0 0 1 0 0 0 1 stud.dat
  [1,16,-10,0,0,1,0,0,0,1,0,0,0,1, ldraw_lib__stud(realsolid)],
// 0
];
module ldraw_lib__s__3004s01(step=0, col=false, unit=2/5, alt=false, line=0.2, solid=!$preview)
    makepoly(ldraw_lib__s__3004s01(solid), step=step, col=col, unit=unit, alt=alt, line=line, solid=solid);
ldraw_lib__s__3004s01(line=0.2);
// file: 3004.scad
use <../lib.scad>
use <s/3004s01.scad>
$fa=1; $fs=0.2;
function ldraw_lib__3004(realsolid=false) = [
// 0 Brick  1 x  2
// 0 Name: 3004.dat
// 0 Author: James Jessiman
// 0 !LDRAW_ORG Part UPDATE 2022-05
// 0 !LICENSE Licensed under CC BY 2.0 and CC BY 4.0 : see CAreadme.txt
// 
// 0 BFC CERTIFY CCW
  [0,"BFC","CERTIFY"],
  [0,"BFC","CCW"],
// 
// 0 !HISTORY 2001-10-26 [PTadmin] Official Update 2001-01
// 0 !HISTORY 2002-05-07 {unknown} BFC Certification
// 0 !HISTORY 2002-06-11 [PTadmin] Official Update 2002-03
// 0 !HISTORY 2007-05-07 [PTadmin] Header formatted for Contributor Agreement
// 0 !HISTORY 2008-07-01 [PTadmin] Official Update 2008-01
// 0 !HISTORY 2022-08-04 [MagFors] Using subfile
// 0 !HISTORY 2022-09-15 [PTadmin] Official Update 2022-05
// 
// 
// 1 16 0 0 0 1 0 0 0 1 0 0 0 1 s\3004s01.dat
  [1,16,0,0,0,1,0,0,0,1,0,0,0,1, ldraw_lib__s__3004s01(realsolid)],
// 4 16 -20 24 -10 20 24 -10 20 0 -10 -20 0 -10
  [4,16,-20,24,-10,20,24,-10,20,0,-10,-20,0,-10],
];
module ldraw_lib__3004(step=0, col=false, unit=2/5, alt=false, line=0.2, solid=!$preview)
    makepoly(ldraw_lib__3004(solid), step=step, col=col, unit=unit, alt=alt, line=line, solid=solid);
ldraw_lib__3004(line=0.2);
// file: s/2815s01.scad
use <../../lib.scad>
$fa=1; $fs=0.2;
function ldraw_lib__s__2815s01(realsolid=false) = [
// 0 ~Technic Wedge Belt Wheel Tyre Segment
// 0 Name: s\2815s01.dat
// 0 Author: Guy Vivan [guyvivan]
// 0 !LDRAW_ORG Subpart UPDATE 2012-01
// 0 !LICENSE Licensed under CC BY 2.0 and CC BY 4.0 : see CAreadme.txt
// 
// 0 BFC CERTIFY CCW
  [0,"BFC","CERTIFY"],
  [0,"BFC","CCW"],
// 
// 0 !HISTORY 2012-01-22 [Philo] Increased precision for better smoothing
// 0 !HISTORY 2012-03-30 [PTadmin] Official Update 2012-01
// 
// 
// 2 24 7.76457 -28.97778 -2 0 -30 -2
  [2,24,7.76457,-28.97778,-2,0,-30,-2],
// 2 24 7.76457 -28.97778 2 0 -30 2
  [2,24,7.76457,-28.97778,2,0,-30,2],
// 4 16 7.76457 -28.97778 -4 0 -30 -4 0 -30 -2 7.76457 -28.97778 -2
  [4,16,7.76457,-28.97778,-4,0,-30,-4,0,-30,-2,7.76457,-28.97778,-2],
// 4 16 7.76457 -28.97778 -2 0 -30 -2 0 -28.58 -1.42 7.397047 -27.60617 -1.42
  [4,16,7.76457,-28.97778,-2,0,-30,-2,0,-28.58,-1.42,7.397047,-27.60617,-1.42],
// 4 16 7.397047 -27.60617 -1.42 0 -28.58 -1.42 0 -28 0 7.246932 -27.04593 0
  [4,16,7.397047,-27.60617,-1.42,0,-28.58,-1.42,0,-28,0,7.246932,-27.04593,0],
// 4 16 7.246932 -27.04593 0 0 -28 0 0 -28.58 1.42 7.397047 -27.60617 1.42
  [4,16,7.246932,-27.04593,0,0,-28,0,0,-28.58,1.42,7.397047,-27.60617,1.42],
// 4 16 7.397047 -27.60617 1.42 0 -28.58 1.42 0 -30 2 7.76457 -28.97778 2
  [4,16,7.397047,-27.60617,1.42,0,-28.58,1.42,0,-30,2,7.76457,-28.97778,2],
// 4 16 7.76457 -28.97778 2 0 -30 2 0 -30 4 7.76457 -28.97778 4
  [4,16,7.76457,-28.97778,2,0,-30,2,0,-30,4,7.76457,-28.97778,4],
// 5 24 7.397047 -27.60617 -1.42 0 -28.58 -1.42 7.76457 -28.97778 -2 7.246932 -27.04593 0
  [5,24,7.397047,-27.60617,-1.42,0,-28.58,-1.42,7.76457,-28.97778,-2,7.246932,-27.04593,0],
// 5 24 7.246932 -27.04593 0 0 -28 0 7.397047 -27.60617 -1.42 7.397047 -27.60617 1.42
  [5,24,7.246932,-27.04593,0,0,-28,0,7.397047,-27.60617,-1.42,7.397047,-27.60617,1.42],
// 5 24 7.397047 -27.60617 1.42 0 -28.58 1.42 7.246932 -27.04593 0 7.76457 -28.97778 2
  [5,24,7.397047,-27.60617,1.42,0,-28.58,1.42,7.246932,-27.04593,0,7.76457,-28.97778,2],
// 2 24 7.76457 -28.97778 -4 0 -30 -4
  [2,24,7.76457,-28.97778,-4,0,-30,-4],
// 2 24 7.76457 -28.97778 4 0 -30 4
  [2,24,7.76457,-28.97778,4,0,-30,4],
// 4 16 7.76457 -28.97778 4 0 -30 4 0 -34 4 8.799846 -32.84148 4
  [4,16,7.76457,-28.97778,4,0,-30,4,0,-34,4,8.799846,-32.84148,4],
// 5 24 9.532304 -35.57505 -2.83 0 -36.83 -2.83 8.799846 -32.84148 -4 9.835122 -36.70519 0
  [5,24,9.532304,-35.57505,-2.83,0,-36.83,-2.83,8.799846,-32.84148,-4,9.835122,-36.70519,0],
// 5 24 9.835122 -36.70519 0 0 -38 0 9.532304 -35.57505 -2.83 9.532304 -35.57505 2.83
  [5,24,9.835122,-36.70519,0,0,-38,0,9.532304,-35.57505,-2.83,9.532304,-35.57505,2.83],
// 5 24 9.532304 -35.57505 2.83 0 -36.83 2.83 9.835122 -36.70519 0 8.799846 -32.84148 4
  [5,24,9.532304,-35.57505,2.83,0,-36.83,2.83,9.835122,-36.70519,0,8.799846,-32.84148,4],
// 5 24 0 -30 -4 0 -30 -2 -7.76 -28.98 -4 7.76457 -28.97778 -4
  [5,24,0,-30,-4,0,-30,-2,-7.76,-28.98,-4,7.76457,-28.97778,-4],
// 5 24 0 -30 -2 0 -28.58 -1.42 -7.76 -28.98 -2 7.76457 -28.97778 -2
  [5,24,0,-30,-2,0,-28.58,-1.42,-7.76,-28.98,-2,7.76457,-28.97778,-2],
// 5 24 0 -28.58 -1.42 0 -28 0 -7.4 -27.61 -1.42 7.397047 -27.60617 -1.42
  [5,24,0,-28.58,-1.42,0,-28,0,-7.4,-27.61,-1.42,7.397047,-27.60617,-1.42],
// 5 24 0 -28 0 0 -28.58 1.42 -7.25 -27.05 0 7.246932 -27.04593 0
  [5,24,0,-28,0,0,-28.58,1.42,-7.25,-27.05,0,7.246932,-27.04593,0],
// 5 24 0 -28.58 1.42 0 -30 2 -7.4 -27.61 1.42 7.397047 -27.60617 1.42
  [5,24,0,-28.58,1.42,0,-30,2,-7.4,-27.61,1.42,7.397047,-27.60617,1.42],
// 5 24 0 -30 2 0 -30 4 -7.76 -28.98 2 7.76457 -28.97778 2
  [5,24,0,-30,2,0,-30,4,-7.76,-28.98,2,7.76457,-28.97778,2],
// 5 24 0 -34 -4 0 -36.83 -2.83 -8.8 -32.84 -4 8.799846 -32.84148 -4
  [5,24,0,-34,-4,0,-36.83,-2.83,-8.8,-32.84,-4,8.799846,-32.84148,-4],
// 5 24 0 -36.83 -2.83 0 -38 0 -9.53 -35.58 -2.83 9.532304 -35.57505 -2.83
  [5,24,0,-36.83,-2.83,0,-38,0,-9.53,-35.58,-2.83,9.532304,-35.57505,-2.83],
// 5 24 0 -38 0 0 -36.83 2.83 -9.84 -36.71 0 9.835122 -36.70519 0
  [5,24,0,-38,0,0,-36.83,2.83,-9.84,-36.71,0,9.835122,-36.70519,0],
// 5 24 0 -36.83 2.83 0 -34 4 -9.53 -35.58 2.83 9.532304 -35.57505 2.83
  [5,24,0,-36.83,2.83,0,-34,4,-9.53,-35.58,2.83,9.532304,-35.57505,2.83],
// 5 24 0 -34 -4 8.799846 -32.84148 -4 0 -30 -4 0 -36.83 -2.83
  [5,24,0,-34,-4,8.799846,-32.84148,-4,0,-30,-4,0,-36.83,-2.83],
// 5 24 8.799846 -32.84148 4 0 -34 4 7.76457 -28.97778 4 9.532304 -35.57505 2.83
  [5,24,8.799846,-32.84148,4,0,-34,4,7.76457,-28.97778,4,9.532304,-35.57505,2.83],
// 4 16 0 -30 -4 7.76457 -28.97778 -4 8.799846 -32.84148 -4 0 -34 -4
  [4,16,0,-30,-4,7.76457,-28.97778,-4,8.799846,-32.84148,-4,0,-34,-4],
// 4 16 8.799846 -32.84148 4 0 -34 4 0 -36.83 2.83 9.532304 -35.57505 2.83
  [4,16,8.799846,-32.84148,4,0,-34,4,0,-36.83,2.83,9.532304,-35.57505,2.83],
// 4 16 9.532304 -35.57505 2.83 0 -36.83 2.83 0 -38 0 9.835122 -36.70519 0
  [4,16,9.532304,-35.57505,2.83,0,-36.83,2.83,0,-38,0,9.835122,-36.70519,0],
// 4 16 9.835122 -36.70519 0 0 -38 0 0 -36.83 -2.83 9.532304 -35.57505 -2.83
  [4,16,9.835122,-36.70519,0,0,-38,0,0,-36.83,-2.83,9.532304,-35.57505,-2.83],
// 4 16 9.532304 -35.57505 -2.83 0 -36.83 -2.83 0 -34 -4 8.799846 -32.84148 -4
  [4,16,9.532304,-35.57505,-2.83,0,-36.83,-2.83,0,-34,-4,8.799846,-32.84148,-4],
// 
];
module ldraw_lib__s__2815s01(step=0, col=false, unit=2/5, alt=false, line=0.2, solid=!$preview)
    makepoly(ldraw_lib__s__2815s01(solid), step=step, col=col, unit=unit, alt=alt, line=line, solid=solid);
ldraw_lib__s__2815s01(line=0.2);
// main file
use <../lib.scad>
use <s/2815s01.scad>
$fa=1; $fs=0.2;
function ldraw_lib__2815(realsolid=false) = [
// 0 Technic Wedge Belt Wheel Tyre
// 0 Name: 2815.dat
// 0 Author: James Jessiman
// 0 !LDRAW_ORG Part UPDATE 2012-01
// 0 !LICENSE Licensed under CC BY 2.0 and CC BY 4.0 : see CAreadme.txt
// 
// 0 BFC CERTIFY CCW
  [0,"BFC","CERTIFY"],
  [0,"BFC","CCW"],
// 
// 0 !HISTORY 2007-07-18 [PTadmin] Header formatted for Contributor Agreement
// 0 !HISTORY 2008-07-01 [PTadmin] Official Update 2008-01
// 0 !HISTORY 2008-07-07 [guyvivan] Made BFC Compliant (2004-08-04)
// 0 !HISTORY 2012-01-30 [cwdee] Renamed from 70162
// 0 !HISTORY 2012-03-30 [PTadmin] Official Update 2012-01
// 
// 
// 1 16 0 0 0 1 0 0 0 1 0 0 0 1 s\2815s01.dat
  [1,16,0,0,0,1,0,0,0,1,0,0,0,1, ldraw_lib__s__2815s01(realsolid)],
// 1 16 0 0 0 0 -1 0 1 0 0 0 0 1 s\2815s01.dat
  [1,16,0,0,0,0,-1,0,1,0,0,0,0,1, ldraw_lib__s__2815s01(realsolid)],
// 1 16 0 0 0 -1 0 0 0 -1 0 0 0 1 s\2815s01.dat
  [1,16,0,0,0,-1,0,0,0,-1,0,0,0,1, ldraw_lib__s__2815s01(realsolid)],
// 1 16 0 0 0 0 1 0 -1 0 0 0 0 1 s\2815s01.dat
  [1,16,0,0,0,0,1,0,-1,0,0,0,0,1, ldraw_lib__s__2815s01(realsolid)],
// 1 16 0 0 0 0.965926 -0.258819 0 0.258819 0.965926 0 0 0 1 s\2815s01.dat
  [1,16,0,0,0,0.965926,-0.258819,0,0.258819,0.965926,0,0,0,1, ldraw_lib__s__2815s01(realsolid)],
// 1 16 0 0 0 -0.258819 -0.965926 0 0.965926 -0.258819 0 0 0 1 s\2815s01.dat
  [1,16,0,0,0,-0.258819,-0.965926,0,0.965926,-0.258819,0,0,0,1, ldraw_lib__s__2815s01(realsolid)],
// 1 16 0 0 0 -0.965926 0.258819 0 -0.258819 -0.965926 0 0 0 1 s\2815s01.dat
  [1,16,0,0,0,-0.965926,0.258819,0,-0.258819,-0.965926,0,0,0,1, ldraw_lib__s__2815s01(realsolid)],
// 1 16 0 0 0 0.258819 0.965926 0 -0.965926 0.258819 0 0 0 1 s\2815s01.dat
  [1,16,0,0,0,0.258819,0.965926,0,-0.965926,0.258819,0,0,0,1, ldraw_lib__s__2815s01(realsolid)],
// 1 16 0 0 0 0.866025 -0.5 0 0.5 0.866025 0 0 0 1 s\2815s01.dat
  [1,16,0,0,0,0.866025,-0.5,0,0.5,0.866025,0,0,0,1, ldraw_lib__s__2815s01(realsolid)],
// 1 16 0 0 0 -0.5 -0.866025 0 0.866025 -0.5 0 0 0 1 s\2815s01.dat
  [1,16,0,0,0,-0.5,-0.866025,0,0.866025,-0.5,0,0,0,1, ldraw_lib__s__2815s01(realsolid)],
// 1 16 0 0 0 -0.866025 0.5 0 -0.5 -0.866025 0 0 0 1 s\2815s01.dat
  [1,16,0,0,0,-0.866025,0.5,0,-0.5,-0.866025,0,0,0,1, ldraw_lib__s__2815s01(realsolid)],
// 1 16 0 0 0 0.5 0.866025 0 -0.866025 0.5 0 0 0 1 s\2815s01.dat
  [1,16,0,0,0,0.5,0.866025,0,-0.866025,0.5,0,0,0,1, ldraw_lib__s__2815s01(realsolid)],
// 1 16 0 0 0 0.707107 -0.707107 0 0.707107 0.707107 0 0 0 1 s\2815s01.dat
  [1,16,0,0,0,0.707107,-0.707107,0,0.707107,0.707107,0,0,0,1, ldraw_lib__s__2815s01(realsolid)],
// 1 16 0 0 0 -0.707107 -0.707107 0 0.707107 -0.707107 0 0 0 1 s\2815s01.dat
  [1,16,0,0,0,-0.707107,-0.707107,0,0.707107,-0.707107,0,0,0,1, ldraw_lib__s__2815s01(realsolid)],
// 1 16 0 0 0 -0.707107 0.707107 0 -0.707107 -0.707107 0 0 0 1 s\2815s01.dat
  [1,16,0,0,0,-0.707107,0.707107,0,-0.707107,-0.707107,0,0,0,1, ldraw_lib__s__2815s01(realsolid)],
// 1 16 0 0 0 0.707107 0.707107 0 -0.707107 0.707107 0 0 0 1 s\2815s01.dat
  [1,16,0,0,0,0.707107,0.707107,0,-0.707107,0.707107,0,0,0,1, ldraw_lib__s__2815s01(realsolid)],
// 1 16 0 0 0 0.5 -0.866025 0 0.866025 0.5 0 0 0 1 s\2815s01.dat
  [1,16,0,0,0,0.5,-0.866025,0,0.866025,0.5,0,0,0,1, ldraw_lib__s__2815s01(realsolid)],
// 1 16 0 0 0 -0.866025 -0.5 0 0.5 -0.866025 0 0 0 1 s\2815s01.dat
  [1,16,0,0,0,-0.866025,-0.5,0,0.5,-0.866025,0,0,0,1, ldraw_lib__s__2815s01(realsolid)],
// 1 16 0 0 0 -0.5 0.866025 0 -0.866025 -0.5 0 0 0 1 s\2815s01.dat
  [1,16,0,0,0,-0.5,0.866025,0,-0.866025,-0.5,0,0,0,1, ldraw_lib__s__2815s01(realsolid)],
// 1 16 0 0 0 0.866025 0.5 0 -0.5 0.866025 0 0 0 1 s\2815s01.dat
  [1,16,0,0,0,0.866025,0.5,0,-0.5,0.866025,0,0,0,1, ldraw_lib__s__2815s01(realsolid)],
// 1 16 0 0 0 0.258819 -0.965926 0 0.965926 0.258819 0 0 0 1 s\2815s01.dat
  [1,16,0,0,0,0.258819,-0.965926,0,0.965926,0.258819,0,0,0,1, ldraw_lib__s__2815s01(realsolid)],
// 1 16 0 0 0 -0.965926 -0.258819 0 0.258819 -0.965926 0 0 0 1 s\2815s01.dat
  [1,16,0,0,0,-0.965926,-0.258819,0,0.258819,-0.965926,0,0,0,1, ldraw_lib__s__2815s01(realsolid)],
// 1 16 0 0 0 -0.258819 0.965926 0 -0.965926 -0.258819 0 0 0 1 s\2815s01.dat
  [1,16,0,0,0,-0.258819,0.965926,0,-0.965926,-0.258819,0,0,0,1, ldraw_lib__s__2815s01(realsolid)],
// 1 16 0 0 0 0.965926 0.258819 0 -0.258819 0.965926 0 0 0 1 s\2815s01.dat
  [1,16,0,0,0,0.965926,0.258819,0,-0.258819,0.965926,0,0,0,1, ldraw_lib__s__2815s01(realsolid)],
// 0
];
module ldraw_lib__2815(step=0, col=false, unit=2/5, alt=false, line=0.2, solid=!$preview)
    makepoly(ldraw_lib__2815(solid), step=step, col=col, unit=unit, alt=alt, line=line, solid=solid);
ldraw_lib__2815(line=0.2);
